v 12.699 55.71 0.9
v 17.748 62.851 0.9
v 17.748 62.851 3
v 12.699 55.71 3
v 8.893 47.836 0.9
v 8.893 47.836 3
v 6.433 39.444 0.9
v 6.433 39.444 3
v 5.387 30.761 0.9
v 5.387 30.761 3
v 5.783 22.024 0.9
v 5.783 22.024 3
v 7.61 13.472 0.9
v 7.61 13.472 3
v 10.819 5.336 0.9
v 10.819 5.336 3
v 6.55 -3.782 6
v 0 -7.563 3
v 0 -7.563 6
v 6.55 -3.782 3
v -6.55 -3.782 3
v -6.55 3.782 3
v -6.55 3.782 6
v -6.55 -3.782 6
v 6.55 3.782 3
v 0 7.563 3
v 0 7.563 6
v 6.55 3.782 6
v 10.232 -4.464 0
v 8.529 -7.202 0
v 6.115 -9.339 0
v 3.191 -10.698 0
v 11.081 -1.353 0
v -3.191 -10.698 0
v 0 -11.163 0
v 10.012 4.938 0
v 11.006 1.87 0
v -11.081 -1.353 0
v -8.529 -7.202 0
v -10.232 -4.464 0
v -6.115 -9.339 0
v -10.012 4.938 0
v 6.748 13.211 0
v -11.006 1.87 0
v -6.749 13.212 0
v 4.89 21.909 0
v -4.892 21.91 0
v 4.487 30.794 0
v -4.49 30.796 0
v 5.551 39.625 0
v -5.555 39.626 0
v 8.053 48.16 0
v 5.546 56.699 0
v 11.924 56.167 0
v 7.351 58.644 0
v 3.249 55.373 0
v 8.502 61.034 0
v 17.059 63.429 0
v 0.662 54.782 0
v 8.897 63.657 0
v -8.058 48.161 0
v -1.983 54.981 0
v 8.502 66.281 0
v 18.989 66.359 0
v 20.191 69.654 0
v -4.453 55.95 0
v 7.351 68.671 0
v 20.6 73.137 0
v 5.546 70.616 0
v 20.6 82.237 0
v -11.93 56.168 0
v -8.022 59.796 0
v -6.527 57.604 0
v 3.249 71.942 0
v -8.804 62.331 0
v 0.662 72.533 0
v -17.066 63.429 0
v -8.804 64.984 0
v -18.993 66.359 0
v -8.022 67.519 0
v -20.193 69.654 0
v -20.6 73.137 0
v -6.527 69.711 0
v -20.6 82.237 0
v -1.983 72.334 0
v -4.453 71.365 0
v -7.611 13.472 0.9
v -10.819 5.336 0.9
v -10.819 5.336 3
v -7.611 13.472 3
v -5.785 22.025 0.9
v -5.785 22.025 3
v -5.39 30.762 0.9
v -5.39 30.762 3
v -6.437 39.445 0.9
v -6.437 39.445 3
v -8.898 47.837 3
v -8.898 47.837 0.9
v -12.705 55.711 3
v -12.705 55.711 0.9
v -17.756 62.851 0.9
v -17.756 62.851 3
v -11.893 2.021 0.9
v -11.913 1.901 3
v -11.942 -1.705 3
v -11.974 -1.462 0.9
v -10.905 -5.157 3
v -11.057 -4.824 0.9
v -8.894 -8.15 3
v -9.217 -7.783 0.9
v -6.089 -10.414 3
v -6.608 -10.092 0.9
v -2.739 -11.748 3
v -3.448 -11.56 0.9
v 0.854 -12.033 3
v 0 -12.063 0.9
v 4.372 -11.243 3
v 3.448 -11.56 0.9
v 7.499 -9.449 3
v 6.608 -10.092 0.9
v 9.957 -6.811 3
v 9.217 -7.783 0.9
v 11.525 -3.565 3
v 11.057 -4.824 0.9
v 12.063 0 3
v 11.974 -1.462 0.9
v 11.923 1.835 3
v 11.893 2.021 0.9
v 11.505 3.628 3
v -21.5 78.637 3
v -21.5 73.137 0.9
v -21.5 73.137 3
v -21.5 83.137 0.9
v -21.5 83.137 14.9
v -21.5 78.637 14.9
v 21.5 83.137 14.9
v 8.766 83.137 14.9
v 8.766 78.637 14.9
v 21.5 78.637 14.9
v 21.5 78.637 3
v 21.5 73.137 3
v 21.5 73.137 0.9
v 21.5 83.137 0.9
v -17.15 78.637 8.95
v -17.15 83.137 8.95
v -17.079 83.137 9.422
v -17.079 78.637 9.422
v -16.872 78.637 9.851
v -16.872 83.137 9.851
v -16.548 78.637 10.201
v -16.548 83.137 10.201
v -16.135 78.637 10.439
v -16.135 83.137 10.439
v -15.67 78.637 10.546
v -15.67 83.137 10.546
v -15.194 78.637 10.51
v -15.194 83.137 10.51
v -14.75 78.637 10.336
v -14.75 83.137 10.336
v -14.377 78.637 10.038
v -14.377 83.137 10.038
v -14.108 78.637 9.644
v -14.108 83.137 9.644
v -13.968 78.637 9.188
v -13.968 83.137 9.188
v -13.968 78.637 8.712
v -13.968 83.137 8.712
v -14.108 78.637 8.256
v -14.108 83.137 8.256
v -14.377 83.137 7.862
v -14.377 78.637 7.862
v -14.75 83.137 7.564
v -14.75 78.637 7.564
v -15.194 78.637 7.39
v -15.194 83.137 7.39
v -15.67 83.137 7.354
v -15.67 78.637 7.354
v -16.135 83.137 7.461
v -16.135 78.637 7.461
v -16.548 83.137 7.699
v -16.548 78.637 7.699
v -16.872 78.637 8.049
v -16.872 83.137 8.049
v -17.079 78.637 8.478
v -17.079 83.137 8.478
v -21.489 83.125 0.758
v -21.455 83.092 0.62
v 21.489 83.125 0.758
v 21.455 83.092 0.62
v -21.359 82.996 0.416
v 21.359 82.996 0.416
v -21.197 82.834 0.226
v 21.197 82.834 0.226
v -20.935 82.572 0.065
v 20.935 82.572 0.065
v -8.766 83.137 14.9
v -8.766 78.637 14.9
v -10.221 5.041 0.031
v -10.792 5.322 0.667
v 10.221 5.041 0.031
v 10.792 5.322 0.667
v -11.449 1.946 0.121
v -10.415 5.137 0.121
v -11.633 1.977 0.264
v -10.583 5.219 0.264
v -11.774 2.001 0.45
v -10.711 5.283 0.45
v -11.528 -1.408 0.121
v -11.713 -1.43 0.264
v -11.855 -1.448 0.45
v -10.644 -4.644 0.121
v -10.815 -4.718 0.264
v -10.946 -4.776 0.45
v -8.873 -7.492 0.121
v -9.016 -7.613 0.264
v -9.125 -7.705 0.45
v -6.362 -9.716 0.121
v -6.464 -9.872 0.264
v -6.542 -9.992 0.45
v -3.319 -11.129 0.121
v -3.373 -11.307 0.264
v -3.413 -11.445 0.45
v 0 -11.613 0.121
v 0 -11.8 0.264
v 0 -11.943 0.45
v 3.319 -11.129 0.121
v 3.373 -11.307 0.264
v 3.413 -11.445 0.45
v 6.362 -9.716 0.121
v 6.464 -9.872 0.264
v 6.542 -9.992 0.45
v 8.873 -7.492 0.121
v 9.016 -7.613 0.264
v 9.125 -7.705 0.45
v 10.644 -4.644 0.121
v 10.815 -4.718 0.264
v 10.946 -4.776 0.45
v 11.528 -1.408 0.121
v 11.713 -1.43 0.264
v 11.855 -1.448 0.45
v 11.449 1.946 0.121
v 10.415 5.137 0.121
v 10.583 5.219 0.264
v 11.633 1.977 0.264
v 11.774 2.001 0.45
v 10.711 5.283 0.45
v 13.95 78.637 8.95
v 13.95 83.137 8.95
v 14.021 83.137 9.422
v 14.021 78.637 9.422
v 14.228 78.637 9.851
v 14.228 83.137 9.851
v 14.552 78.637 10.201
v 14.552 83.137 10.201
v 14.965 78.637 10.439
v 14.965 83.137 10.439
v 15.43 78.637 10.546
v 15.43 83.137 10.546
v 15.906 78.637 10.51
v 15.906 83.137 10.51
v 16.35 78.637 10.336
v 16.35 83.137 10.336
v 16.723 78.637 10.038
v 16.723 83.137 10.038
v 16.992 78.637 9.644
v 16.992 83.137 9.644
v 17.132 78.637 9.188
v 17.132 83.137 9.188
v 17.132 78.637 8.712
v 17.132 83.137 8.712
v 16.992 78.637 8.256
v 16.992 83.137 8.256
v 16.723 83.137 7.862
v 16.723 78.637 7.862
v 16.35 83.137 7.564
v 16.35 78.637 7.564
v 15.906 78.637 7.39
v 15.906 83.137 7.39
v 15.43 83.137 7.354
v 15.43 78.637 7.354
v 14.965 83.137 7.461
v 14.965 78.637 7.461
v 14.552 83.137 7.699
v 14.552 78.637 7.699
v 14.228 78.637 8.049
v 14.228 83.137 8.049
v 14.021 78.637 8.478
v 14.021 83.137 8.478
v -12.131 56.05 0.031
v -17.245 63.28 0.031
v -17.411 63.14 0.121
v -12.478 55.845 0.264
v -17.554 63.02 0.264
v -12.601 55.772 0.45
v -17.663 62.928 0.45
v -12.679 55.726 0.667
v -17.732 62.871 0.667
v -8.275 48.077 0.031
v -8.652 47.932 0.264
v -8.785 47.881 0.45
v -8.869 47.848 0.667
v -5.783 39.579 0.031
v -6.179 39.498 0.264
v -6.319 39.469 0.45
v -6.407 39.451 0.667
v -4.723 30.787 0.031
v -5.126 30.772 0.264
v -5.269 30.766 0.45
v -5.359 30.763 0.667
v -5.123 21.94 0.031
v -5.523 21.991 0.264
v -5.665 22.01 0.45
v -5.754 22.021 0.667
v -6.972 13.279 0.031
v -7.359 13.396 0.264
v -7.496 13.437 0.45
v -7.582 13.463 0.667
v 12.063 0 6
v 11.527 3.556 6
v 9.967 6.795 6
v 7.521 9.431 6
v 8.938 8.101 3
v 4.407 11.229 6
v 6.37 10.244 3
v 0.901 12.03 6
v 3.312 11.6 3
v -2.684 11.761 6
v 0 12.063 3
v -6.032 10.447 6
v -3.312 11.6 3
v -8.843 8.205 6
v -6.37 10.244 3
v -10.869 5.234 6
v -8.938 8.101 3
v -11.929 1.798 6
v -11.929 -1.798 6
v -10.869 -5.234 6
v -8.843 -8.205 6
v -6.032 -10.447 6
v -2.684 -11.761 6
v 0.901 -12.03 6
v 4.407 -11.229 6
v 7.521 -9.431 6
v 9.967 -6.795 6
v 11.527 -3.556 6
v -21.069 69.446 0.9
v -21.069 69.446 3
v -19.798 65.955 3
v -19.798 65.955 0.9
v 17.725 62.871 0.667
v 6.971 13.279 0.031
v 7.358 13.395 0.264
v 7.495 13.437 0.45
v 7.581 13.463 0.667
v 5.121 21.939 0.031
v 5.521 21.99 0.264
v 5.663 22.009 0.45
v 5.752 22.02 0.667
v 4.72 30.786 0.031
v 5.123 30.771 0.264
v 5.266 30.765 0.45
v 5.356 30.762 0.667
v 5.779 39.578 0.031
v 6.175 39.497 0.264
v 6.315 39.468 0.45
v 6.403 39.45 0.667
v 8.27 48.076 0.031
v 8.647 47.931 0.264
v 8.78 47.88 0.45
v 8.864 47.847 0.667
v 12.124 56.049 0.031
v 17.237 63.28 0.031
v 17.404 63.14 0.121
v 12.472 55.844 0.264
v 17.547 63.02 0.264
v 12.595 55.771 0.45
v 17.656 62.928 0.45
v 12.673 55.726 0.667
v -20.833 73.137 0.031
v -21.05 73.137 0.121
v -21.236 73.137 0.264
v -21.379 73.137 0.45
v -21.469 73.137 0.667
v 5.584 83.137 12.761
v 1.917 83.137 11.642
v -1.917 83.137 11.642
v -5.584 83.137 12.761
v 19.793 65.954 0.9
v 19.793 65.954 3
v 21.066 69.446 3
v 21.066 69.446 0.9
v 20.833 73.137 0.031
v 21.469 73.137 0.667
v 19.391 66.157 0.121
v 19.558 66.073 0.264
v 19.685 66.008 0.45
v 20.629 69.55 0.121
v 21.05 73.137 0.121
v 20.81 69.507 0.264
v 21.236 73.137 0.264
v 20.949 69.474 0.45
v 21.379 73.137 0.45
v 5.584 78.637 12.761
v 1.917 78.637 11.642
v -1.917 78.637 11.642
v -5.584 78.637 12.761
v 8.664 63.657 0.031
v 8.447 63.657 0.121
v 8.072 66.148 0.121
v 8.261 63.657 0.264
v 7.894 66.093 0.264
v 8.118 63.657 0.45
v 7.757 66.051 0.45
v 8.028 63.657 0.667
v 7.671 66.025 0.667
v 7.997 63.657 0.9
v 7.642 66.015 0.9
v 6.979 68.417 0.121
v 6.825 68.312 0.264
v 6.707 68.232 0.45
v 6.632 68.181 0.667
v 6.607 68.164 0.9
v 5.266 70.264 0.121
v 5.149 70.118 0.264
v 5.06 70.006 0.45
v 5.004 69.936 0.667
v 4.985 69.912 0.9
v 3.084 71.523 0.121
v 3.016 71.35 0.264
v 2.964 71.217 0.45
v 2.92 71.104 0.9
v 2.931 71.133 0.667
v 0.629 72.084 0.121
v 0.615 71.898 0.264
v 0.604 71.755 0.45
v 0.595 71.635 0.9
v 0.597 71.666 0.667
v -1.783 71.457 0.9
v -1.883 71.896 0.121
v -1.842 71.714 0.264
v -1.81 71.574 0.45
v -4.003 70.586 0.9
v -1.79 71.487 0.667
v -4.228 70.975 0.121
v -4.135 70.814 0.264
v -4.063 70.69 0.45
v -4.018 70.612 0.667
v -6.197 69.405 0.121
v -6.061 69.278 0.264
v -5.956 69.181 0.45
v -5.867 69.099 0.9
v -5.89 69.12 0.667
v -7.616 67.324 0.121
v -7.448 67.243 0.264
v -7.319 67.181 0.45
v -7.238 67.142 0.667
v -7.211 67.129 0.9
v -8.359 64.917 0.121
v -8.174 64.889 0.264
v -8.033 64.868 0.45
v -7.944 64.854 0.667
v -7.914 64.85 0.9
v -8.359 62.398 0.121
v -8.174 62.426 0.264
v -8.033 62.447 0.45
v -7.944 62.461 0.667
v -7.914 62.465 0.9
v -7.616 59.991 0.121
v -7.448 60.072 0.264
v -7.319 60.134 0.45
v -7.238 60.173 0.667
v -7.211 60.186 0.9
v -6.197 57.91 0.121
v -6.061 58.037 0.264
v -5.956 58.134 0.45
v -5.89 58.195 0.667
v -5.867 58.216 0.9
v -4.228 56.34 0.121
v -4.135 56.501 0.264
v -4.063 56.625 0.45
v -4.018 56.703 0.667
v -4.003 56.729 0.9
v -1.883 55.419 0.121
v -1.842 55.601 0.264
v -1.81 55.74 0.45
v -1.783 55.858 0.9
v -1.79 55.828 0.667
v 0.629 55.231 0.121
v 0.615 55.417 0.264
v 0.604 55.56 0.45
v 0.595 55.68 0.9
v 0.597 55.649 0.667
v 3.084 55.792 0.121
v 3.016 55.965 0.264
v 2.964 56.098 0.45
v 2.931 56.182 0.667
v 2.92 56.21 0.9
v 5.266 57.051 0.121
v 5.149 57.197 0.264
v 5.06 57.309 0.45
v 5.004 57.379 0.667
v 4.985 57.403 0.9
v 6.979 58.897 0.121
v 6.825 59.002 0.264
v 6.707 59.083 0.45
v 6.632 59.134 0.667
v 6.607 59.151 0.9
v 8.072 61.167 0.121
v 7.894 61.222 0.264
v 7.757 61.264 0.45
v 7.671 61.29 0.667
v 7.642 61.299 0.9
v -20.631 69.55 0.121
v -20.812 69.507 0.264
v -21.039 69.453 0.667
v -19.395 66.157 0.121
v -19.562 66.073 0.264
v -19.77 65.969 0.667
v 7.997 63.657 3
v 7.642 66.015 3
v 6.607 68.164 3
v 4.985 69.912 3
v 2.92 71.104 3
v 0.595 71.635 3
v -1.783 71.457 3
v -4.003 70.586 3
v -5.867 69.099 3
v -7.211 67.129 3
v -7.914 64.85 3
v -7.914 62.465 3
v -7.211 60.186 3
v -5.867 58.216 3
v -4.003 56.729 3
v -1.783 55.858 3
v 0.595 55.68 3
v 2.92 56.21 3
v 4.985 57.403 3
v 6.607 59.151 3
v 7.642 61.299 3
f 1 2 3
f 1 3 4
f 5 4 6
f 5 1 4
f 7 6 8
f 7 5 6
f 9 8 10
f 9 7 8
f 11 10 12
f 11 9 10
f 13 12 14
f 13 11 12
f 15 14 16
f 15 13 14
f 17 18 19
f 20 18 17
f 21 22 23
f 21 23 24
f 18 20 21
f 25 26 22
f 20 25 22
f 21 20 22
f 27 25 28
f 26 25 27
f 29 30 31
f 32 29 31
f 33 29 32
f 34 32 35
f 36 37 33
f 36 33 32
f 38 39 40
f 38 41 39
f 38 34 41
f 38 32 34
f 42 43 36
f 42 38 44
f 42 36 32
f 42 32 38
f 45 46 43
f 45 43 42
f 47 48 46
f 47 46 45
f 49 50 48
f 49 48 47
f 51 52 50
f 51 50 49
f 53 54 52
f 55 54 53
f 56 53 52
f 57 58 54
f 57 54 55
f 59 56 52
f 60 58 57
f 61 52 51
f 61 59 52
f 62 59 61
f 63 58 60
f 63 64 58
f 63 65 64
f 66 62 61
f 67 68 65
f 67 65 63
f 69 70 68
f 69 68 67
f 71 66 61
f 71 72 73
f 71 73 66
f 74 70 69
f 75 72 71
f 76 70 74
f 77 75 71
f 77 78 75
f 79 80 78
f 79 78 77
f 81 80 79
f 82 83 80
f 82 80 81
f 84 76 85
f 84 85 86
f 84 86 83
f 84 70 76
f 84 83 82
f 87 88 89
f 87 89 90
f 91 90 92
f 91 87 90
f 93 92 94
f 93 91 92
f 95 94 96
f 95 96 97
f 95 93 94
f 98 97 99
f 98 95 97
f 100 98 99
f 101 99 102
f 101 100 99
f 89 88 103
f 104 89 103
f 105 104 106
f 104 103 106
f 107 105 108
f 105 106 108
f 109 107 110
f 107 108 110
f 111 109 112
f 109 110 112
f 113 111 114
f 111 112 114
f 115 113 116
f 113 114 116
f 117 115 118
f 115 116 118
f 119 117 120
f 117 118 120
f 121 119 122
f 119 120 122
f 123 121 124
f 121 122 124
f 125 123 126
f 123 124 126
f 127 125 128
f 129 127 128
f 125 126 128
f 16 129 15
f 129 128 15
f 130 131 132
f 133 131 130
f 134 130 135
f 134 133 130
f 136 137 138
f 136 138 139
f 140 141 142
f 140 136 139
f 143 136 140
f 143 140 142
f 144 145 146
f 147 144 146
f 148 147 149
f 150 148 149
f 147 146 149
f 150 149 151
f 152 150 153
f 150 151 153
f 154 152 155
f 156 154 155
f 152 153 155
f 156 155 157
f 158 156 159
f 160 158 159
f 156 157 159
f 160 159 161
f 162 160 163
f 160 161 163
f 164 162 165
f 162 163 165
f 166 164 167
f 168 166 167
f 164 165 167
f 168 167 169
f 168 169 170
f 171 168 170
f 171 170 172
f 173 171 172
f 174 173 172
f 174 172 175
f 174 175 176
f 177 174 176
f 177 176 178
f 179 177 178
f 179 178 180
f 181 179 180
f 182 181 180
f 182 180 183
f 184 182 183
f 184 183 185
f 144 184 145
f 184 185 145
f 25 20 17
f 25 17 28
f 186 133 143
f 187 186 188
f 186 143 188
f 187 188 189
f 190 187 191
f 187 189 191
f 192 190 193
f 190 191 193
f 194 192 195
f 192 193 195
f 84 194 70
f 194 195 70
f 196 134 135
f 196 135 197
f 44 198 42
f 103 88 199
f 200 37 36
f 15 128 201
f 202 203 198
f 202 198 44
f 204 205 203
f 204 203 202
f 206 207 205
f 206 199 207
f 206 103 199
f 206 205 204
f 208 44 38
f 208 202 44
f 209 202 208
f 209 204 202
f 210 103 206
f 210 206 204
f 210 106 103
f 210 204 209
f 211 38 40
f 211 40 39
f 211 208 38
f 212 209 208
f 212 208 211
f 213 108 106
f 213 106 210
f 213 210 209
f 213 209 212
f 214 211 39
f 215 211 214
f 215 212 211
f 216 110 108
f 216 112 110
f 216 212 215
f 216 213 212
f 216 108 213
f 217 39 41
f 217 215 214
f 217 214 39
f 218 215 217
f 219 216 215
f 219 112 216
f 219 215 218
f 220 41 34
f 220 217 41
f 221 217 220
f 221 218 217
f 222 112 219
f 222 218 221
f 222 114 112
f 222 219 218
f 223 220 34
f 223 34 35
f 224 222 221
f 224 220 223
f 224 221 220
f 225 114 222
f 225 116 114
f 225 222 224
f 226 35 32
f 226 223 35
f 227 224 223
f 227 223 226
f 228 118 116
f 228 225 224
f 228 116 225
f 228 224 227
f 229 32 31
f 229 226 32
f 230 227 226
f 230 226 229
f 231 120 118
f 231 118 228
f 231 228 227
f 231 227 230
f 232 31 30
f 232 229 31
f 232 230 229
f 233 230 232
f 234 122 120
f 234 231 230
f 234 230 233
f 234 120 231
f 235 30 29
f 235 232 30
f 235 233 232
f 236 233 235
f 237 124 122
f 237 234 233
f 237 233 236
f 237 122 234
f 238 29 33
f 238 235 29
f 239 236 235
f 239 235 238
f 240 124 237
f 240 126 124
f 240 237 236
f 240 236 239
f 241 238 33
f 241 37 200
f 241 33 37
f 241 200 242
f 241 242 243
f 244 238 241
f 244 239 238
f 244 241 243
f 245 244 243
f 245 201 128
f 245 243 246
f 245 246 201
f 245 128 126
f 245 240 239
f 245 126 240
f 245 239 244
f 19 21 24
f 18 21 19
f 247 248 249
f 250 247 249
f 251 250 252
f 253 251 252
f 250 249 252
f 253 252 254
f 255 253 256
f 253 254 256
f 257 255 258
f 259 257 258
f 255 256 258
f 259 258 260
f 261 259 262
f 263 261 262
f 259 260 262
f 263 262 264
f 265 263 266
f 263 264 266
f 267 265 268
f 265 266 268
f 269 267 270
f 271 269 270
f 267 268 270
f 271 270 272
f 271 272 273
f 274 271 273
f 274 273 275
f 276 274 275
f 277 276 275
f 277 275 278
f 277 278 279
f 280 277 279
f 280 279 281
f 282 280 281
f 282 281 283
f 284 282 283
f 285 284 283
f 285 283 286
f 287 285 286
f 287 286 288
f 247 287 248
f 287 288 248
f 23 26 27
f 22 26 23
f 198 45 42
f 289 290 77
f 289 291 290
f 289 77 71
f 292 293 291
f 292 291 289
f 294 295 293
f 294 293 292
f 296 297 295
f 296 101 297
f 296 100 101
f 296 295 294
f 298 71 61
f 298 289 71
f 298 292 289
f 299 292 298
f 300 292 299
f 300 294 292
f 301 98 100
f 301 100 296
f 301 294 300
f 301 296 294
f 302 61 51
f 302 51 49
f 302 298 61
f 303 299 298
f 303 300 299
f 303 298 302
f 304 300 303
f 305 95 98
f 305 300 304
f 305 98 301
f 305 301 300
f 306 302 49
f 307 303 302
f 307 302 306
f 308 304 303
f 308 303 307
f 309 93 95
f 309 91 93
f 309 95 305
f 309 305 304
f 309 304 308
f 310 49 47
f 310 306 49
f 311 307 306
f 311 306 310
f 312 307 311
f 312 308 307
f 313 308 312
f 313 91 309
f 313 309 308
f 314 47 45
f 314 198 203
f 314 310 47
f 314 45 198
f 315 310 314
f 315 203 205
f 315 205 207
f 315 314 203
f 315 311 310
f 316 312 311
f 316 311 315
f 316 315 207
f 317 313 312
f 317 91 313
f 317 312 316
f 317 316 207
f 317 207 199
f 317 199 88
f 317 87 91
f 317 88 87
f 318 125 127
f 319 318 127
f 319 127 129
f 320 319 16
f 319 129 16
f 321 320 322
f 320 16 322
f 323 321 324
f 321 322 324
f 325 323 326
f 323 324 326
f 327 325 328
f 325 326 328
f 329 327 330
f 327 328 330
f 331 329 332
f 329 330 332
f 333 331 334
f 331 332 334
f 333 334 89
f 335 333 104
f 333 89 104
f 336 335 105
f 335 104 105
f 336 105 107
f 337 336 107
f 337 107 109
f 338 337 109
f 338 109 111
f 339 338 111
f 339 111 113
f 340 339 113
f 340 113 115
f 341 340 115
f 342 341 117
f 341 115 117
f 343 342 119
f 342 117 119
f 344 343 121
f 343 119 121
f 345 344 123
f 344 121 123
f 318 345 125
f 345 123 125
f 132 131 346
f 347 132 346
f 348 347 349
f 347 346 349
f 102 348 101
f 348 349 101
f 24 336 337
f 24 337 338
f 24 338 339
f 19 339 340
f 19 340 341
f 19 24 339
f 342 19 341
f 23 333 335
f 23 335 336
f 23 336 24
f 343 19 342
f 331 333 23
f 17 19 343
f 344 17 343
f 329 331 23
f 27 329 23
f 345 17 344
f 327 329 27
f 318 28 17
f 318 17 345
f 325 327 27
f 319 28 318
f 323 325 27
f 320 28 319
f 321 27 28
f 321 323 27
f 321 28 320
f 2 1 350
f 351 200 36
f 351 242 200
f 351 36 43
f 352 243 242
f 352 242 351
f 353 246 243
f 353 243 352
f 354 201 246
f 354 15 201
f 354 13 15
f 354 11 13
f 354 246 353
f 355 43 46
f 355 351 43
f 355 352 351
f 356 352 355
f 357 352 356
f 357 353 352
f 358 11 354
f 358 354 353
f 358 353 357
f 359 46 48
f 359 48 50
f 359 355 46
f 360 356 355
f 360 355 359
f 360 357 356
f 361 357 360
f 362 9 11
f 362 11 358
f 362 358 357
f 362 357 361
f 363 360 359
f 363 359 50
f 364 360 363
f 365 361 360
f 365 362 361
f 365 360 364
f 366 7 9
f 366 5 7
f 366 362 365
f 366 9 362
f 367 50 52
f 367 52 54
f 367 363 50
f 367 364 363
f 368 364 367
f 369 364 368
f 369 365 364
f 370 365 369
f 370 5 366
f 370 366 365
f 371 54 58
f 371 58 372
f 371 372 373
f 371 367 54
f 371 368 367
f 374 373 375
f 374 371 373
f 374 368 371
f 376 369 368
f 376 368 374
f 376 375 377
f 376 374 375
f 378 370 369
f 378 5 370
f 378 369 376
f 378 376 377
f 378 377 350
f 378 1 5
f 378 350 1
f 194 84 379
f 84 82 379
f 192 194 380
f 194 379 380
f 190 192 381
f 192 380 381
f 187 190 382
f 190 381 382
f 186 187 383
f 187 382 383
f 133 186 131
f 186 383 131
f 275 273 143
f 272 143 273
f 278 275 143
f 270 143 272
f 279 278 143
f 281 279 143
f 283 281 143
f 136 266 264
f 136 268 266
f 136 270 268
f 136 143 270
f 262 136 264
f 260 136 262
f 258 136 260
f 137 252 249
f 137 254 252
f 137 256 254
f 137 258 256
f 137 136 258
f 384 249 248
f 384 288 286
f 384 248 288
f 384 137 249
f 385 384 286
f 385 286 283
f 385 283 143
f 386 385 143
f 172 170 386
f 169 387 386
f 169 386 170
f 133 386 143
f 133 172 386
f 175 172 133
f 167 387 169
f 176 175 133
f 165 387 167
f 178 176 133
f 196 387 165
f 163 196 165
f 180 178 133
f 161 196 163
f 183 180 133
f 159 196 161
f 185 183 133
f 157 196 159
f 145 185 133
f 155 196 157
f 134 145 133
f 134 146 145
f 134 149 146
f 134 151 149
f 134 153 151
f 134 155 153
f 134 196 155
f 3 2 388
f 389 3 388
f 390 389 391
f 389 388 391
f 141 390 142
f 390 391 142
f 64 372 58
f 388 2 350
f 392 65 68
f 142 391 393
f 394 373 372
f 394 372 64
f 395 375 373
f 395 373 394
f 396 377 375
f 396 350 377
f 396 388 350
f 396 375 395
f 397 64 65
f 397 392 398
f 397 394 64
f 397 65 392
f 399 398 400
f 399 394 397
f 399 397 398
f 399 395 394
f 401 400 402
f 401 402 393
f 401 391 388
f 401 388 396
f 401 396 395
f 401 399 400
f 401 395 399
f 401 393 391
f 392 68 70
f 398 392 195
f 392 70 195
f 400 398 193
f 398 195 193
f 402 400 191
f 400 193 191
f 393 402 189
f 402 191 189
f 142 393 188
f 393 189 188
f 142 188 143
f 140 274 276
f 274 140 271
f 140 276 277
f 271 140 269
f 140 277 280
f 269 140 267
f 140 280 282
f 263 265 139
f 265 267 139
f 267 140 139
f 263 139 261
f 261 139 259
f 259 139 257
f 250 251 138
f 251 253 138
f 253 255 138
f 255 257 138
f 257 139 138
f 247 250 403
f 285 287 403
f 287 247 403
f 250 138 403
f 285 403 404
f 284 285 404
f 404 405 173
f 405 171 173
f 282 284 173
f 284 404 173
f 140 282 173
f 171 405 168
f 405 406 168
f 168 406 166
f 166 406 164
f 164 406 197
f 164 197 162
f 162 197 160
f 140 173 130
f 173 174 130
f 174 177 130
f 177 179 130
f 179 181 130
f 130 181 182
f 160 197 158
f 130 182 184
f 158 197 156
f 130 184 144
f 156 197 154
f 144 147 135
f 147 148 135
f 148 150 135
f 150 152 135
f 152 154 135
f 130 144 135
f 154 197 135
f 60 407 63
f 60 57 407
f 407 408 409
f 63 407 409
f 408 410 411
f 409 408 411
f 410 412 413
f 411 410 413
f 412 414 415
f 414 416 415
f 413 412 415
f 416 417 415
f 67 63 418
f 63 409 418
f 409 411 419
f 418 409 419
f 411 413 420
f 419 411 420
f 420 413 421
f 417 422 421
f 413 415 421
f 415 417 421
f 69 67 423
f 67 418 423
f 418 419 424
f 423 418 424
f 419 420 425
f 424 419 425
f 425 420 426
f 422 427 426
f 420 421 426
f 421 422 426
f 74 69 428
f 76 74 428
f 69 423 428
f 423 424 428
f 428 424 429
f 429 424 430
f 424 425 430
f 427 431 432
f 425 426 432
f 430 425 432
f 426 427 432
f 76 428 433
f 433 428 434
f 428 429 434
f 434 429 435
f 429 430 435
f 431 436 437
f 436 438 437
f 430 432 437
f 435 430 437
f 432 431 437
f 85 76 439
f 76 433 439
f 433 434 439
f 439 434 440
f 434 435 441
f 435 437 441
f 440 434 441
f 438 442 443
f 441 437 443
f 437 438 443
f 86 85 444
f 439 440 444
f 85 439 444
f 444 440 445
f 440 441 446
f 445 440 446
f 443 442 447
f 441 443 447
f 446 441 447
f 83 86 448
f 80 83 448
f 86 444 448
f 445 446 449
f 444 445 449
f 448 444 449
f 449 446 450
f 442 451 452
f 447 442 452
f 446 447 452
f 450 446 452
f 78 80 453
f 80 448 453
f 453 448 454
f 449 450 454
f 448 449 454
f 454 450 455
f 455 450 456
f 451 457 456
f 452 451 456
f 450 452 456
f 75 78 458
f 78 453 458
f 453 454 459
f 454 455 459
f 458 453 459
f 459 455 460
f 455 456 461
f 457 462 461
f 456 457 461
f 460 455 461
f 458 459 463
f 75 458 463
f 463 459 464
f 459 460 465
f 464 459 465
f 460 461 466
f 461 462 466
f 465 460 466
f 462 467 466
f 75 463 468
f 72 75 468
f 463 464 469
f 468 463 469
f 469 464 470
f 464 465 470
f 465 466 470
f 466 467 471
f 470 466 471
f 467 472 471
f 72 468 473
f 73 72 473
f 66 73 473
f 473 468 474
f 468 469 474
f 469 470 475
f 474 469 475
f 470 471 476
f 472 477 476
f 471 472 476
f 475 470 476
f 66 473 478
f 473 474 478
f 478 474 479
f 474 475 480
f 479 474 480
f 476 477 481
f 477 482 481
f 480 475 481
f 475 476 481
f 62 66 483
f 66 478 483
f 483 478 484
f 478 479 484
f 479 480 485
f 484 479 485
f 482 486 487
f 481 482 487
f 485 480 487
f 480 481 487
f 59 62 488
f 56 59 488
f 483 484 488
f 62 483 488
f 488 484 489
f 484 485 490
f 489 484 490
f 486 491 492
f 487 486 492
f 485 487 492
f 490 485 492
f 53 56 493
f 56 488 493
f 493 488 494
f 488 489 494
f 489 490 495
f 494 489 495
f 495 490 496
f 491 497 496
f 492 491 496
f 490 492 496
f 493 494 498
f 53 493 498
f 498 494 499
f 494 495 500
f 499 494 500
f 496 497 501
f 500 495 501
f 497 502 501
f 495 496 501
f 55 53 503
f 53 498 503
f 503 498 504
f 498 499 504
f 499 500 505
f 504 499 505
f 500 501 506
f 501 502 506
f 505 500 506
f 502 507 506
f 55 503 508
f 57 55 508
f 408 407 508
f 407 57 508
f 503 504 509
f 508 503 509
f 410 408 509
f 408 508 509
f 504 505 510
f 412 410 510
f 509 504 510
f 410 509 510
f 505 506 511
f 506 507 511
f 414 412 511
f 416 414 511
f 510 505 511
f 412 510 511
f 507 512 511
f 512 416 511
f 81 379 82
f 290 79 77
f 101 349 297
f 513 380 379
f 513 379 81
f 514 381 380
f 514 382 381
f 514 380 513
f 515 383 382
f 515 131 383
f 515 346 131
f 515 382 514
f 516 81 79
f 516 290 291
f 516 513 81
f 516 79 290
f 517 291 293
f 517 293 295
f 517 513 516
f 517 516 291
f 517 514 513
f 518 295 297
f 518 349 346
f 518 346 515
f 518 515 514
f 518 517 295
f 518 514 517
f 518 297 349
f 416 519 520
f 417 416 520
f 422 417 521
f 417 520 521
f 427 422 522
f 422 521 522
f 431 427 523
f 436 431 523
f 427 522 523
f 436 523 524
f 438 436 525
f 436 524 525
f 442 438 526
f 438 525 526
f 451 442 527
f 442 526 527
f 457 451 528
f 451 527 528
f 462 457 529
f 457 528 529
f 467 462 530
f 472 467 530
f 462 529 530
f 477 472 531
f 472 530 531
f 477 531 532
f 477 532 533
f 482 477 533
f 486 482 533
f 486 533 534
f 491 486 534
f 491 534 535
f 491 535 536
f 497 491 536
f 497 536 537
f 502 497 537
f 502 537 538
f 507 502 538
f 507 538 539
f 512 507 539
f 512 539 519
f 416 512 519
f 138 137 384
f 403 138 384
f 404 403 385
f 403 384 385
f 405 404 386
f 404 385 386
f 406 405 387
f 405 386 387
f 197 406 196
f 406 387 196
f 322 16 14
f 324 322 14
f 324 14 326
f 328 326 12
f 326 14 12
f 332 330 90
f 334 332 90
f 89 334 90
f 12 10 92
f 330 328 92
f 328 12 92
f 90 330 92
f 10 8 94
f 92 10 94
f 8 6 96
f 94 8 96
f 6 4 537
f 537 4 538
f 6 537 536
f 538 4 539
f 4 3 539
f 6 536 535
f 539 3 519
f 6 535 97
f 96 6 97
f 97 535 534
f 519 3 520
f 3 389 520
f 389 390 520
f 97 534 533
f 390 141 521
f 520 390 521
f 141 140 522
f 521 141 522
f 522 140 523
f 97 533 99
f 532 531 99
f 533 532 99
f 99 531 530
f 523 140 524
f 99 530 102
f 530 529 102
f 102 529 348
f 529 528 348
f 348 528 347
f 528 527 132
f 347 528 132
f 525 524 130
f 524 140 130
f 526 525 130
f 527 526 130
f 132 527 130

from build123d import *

# Parameters (mm, degrees)
SKETCH002_AS_DRAWN_R                      = 1.6
EXTRUDE001_DEPTH                          = 4.5
EXTRUDE001_ONTO_SKETCH002_ROLL_ANGLE      = 90
EXTRUDE001_ONTO_SKETCH002_PLACEMENT_ANGLE = 180
EXTRUDE_DEPTH                             = 3
SKETCH001_R                               = 12.063289
PAD_DEPTH                                 = 3
SKETCH003_R                               = 8
POCKET_DEPTH                              = 3.001
FILLET_R                                  = 0.9


with BuildPart() as extrude001:
    # Sketch002 as drawn → Extrude001 (new)
    with BuildSketch(Plane.XY):
        with BuildLine():
            Line((-8.765843, 14.9), (-21.5, 14.9))
            Line((-21.5, 14.9), (-21.5, 3))
            Line((-21.5, 3), (21.5, 3))
            Line((21.5, 3), (21.5, 14.9))
            Line((21.5, 14.9), (8.765843, 14.9))
            ThreePointArc((-8.765843, 14.9), (0, 11.5), (8.765843, 14.9))
        make_face()
        with Locations((-15.55, 8.95)):
            Circle(SKETCH002_AS_DRAWN_R, mode=Mode.SUBTRACT)
        with Locations((15.55, 8.95)):
            Circle(SKETCH002_AS_DRAWN_R, mode=Mode.SUBTRACT)
    extrude(amount=-EXTRUDE001_DEPTH)


with BuildPart() as extrude001_1:
    # Extrude001 onto Sketch002 roll: moved
    add(extrude001.part.rotate(Axis((0, 0, 0), (1, 0, 0)), EXTRUDE001_ONTO_SKETCH002_ROLL_ANGLE))


with BuildPart() as extrude001_2:
    # Extrude001 onto Sketch002 placement: moved
    add(extrude001_1.part.moved(Location((0, 83.136711, 0))).rotate(Axis((0, 83.136711, 0), (0, 0, 1)), EXTRUDE001_ONTO_SKETCH002_PLACEMENT_ANGLE))


with BuildPart() as fillet_body:
    # Sketch → Extrude (new body)
    with BuildSketch(Plane.XY):
        with BuildLine():
            Line((-21.5, 83.136711), (21.5, 83.136711))
            Line((21.5, 83.136711), (21.5, 73.136711))
            ThreePointArc((17.748453, 62.850809), (20.531425, 67.662881), (21.5, 73.136711))
            ThreePointArc((17.748453, 62.850809), (5.730319, 35.123847), (10.819042, 5.335848))
            ThreePointArc((-10.819042, 5.335848), (0, -12.063289), (10.819042, 5.335848))
            ThreePointArc((-10.819042, 5.335848), (-5.733751, 35.124931), (-17.75562, 62.850809))
            ThreePointArc((-21.5, 73.136711), (-20.534792, 67.663591), (-17.75562, 62.850809))
            Line((-21.5, 83.136711), (-21.5, 73.136711))
        make_face()
    extrude(amount=EXTRUDE_DEPTH)

    # Sketch001 → Pad (new body)
    with BuildSketch(Plane.XY.offset(3)):
        Circle(SKETCH001_R)
        Polygon((0, 7.563289), (-6.55, 3.781644), (-6.55, -3.781644), (0, -7.563289), (6.55, -3.781644), (6.55, 3.781644), align=None, mode=Mode.SUBTRACT)
    extrude(amount=PAD_DEPTH)

    # Fusion: union Extrude001
    add(extrude001_2.part)

    # Sketch003 → Pocket (cut, through all)
    with BuildSketch(Plane.XY.offset(3)):
        with Locations((-0.002934, 63.657442)):
            Circle(SKETCH003_R)
    extrude(amount=-POCKET_DEPTH, mode=Mode.SUBTRACT)

    # Fillet
    fillet_edges = [fillet_body.edges().sort_by_distance(p)[0] for p in [
        (-21.5, 78.136711, 0),
        (0, 83.136711, 0),
        (-20.534792, 67.663591, 0),
        (21.5, 78.136711, 0),
        (-5.733751, 35.124931, 0),
        (20.531425, 67.662881, 0),
        (0, -12.063289, 0),
        (5.730319, 35.123847, 0),
        (-8.002934, 63.657442, 0),
    ]]
    fillet(fillet_edges, radius=FILLET_R)


solid = fillet_body.part
